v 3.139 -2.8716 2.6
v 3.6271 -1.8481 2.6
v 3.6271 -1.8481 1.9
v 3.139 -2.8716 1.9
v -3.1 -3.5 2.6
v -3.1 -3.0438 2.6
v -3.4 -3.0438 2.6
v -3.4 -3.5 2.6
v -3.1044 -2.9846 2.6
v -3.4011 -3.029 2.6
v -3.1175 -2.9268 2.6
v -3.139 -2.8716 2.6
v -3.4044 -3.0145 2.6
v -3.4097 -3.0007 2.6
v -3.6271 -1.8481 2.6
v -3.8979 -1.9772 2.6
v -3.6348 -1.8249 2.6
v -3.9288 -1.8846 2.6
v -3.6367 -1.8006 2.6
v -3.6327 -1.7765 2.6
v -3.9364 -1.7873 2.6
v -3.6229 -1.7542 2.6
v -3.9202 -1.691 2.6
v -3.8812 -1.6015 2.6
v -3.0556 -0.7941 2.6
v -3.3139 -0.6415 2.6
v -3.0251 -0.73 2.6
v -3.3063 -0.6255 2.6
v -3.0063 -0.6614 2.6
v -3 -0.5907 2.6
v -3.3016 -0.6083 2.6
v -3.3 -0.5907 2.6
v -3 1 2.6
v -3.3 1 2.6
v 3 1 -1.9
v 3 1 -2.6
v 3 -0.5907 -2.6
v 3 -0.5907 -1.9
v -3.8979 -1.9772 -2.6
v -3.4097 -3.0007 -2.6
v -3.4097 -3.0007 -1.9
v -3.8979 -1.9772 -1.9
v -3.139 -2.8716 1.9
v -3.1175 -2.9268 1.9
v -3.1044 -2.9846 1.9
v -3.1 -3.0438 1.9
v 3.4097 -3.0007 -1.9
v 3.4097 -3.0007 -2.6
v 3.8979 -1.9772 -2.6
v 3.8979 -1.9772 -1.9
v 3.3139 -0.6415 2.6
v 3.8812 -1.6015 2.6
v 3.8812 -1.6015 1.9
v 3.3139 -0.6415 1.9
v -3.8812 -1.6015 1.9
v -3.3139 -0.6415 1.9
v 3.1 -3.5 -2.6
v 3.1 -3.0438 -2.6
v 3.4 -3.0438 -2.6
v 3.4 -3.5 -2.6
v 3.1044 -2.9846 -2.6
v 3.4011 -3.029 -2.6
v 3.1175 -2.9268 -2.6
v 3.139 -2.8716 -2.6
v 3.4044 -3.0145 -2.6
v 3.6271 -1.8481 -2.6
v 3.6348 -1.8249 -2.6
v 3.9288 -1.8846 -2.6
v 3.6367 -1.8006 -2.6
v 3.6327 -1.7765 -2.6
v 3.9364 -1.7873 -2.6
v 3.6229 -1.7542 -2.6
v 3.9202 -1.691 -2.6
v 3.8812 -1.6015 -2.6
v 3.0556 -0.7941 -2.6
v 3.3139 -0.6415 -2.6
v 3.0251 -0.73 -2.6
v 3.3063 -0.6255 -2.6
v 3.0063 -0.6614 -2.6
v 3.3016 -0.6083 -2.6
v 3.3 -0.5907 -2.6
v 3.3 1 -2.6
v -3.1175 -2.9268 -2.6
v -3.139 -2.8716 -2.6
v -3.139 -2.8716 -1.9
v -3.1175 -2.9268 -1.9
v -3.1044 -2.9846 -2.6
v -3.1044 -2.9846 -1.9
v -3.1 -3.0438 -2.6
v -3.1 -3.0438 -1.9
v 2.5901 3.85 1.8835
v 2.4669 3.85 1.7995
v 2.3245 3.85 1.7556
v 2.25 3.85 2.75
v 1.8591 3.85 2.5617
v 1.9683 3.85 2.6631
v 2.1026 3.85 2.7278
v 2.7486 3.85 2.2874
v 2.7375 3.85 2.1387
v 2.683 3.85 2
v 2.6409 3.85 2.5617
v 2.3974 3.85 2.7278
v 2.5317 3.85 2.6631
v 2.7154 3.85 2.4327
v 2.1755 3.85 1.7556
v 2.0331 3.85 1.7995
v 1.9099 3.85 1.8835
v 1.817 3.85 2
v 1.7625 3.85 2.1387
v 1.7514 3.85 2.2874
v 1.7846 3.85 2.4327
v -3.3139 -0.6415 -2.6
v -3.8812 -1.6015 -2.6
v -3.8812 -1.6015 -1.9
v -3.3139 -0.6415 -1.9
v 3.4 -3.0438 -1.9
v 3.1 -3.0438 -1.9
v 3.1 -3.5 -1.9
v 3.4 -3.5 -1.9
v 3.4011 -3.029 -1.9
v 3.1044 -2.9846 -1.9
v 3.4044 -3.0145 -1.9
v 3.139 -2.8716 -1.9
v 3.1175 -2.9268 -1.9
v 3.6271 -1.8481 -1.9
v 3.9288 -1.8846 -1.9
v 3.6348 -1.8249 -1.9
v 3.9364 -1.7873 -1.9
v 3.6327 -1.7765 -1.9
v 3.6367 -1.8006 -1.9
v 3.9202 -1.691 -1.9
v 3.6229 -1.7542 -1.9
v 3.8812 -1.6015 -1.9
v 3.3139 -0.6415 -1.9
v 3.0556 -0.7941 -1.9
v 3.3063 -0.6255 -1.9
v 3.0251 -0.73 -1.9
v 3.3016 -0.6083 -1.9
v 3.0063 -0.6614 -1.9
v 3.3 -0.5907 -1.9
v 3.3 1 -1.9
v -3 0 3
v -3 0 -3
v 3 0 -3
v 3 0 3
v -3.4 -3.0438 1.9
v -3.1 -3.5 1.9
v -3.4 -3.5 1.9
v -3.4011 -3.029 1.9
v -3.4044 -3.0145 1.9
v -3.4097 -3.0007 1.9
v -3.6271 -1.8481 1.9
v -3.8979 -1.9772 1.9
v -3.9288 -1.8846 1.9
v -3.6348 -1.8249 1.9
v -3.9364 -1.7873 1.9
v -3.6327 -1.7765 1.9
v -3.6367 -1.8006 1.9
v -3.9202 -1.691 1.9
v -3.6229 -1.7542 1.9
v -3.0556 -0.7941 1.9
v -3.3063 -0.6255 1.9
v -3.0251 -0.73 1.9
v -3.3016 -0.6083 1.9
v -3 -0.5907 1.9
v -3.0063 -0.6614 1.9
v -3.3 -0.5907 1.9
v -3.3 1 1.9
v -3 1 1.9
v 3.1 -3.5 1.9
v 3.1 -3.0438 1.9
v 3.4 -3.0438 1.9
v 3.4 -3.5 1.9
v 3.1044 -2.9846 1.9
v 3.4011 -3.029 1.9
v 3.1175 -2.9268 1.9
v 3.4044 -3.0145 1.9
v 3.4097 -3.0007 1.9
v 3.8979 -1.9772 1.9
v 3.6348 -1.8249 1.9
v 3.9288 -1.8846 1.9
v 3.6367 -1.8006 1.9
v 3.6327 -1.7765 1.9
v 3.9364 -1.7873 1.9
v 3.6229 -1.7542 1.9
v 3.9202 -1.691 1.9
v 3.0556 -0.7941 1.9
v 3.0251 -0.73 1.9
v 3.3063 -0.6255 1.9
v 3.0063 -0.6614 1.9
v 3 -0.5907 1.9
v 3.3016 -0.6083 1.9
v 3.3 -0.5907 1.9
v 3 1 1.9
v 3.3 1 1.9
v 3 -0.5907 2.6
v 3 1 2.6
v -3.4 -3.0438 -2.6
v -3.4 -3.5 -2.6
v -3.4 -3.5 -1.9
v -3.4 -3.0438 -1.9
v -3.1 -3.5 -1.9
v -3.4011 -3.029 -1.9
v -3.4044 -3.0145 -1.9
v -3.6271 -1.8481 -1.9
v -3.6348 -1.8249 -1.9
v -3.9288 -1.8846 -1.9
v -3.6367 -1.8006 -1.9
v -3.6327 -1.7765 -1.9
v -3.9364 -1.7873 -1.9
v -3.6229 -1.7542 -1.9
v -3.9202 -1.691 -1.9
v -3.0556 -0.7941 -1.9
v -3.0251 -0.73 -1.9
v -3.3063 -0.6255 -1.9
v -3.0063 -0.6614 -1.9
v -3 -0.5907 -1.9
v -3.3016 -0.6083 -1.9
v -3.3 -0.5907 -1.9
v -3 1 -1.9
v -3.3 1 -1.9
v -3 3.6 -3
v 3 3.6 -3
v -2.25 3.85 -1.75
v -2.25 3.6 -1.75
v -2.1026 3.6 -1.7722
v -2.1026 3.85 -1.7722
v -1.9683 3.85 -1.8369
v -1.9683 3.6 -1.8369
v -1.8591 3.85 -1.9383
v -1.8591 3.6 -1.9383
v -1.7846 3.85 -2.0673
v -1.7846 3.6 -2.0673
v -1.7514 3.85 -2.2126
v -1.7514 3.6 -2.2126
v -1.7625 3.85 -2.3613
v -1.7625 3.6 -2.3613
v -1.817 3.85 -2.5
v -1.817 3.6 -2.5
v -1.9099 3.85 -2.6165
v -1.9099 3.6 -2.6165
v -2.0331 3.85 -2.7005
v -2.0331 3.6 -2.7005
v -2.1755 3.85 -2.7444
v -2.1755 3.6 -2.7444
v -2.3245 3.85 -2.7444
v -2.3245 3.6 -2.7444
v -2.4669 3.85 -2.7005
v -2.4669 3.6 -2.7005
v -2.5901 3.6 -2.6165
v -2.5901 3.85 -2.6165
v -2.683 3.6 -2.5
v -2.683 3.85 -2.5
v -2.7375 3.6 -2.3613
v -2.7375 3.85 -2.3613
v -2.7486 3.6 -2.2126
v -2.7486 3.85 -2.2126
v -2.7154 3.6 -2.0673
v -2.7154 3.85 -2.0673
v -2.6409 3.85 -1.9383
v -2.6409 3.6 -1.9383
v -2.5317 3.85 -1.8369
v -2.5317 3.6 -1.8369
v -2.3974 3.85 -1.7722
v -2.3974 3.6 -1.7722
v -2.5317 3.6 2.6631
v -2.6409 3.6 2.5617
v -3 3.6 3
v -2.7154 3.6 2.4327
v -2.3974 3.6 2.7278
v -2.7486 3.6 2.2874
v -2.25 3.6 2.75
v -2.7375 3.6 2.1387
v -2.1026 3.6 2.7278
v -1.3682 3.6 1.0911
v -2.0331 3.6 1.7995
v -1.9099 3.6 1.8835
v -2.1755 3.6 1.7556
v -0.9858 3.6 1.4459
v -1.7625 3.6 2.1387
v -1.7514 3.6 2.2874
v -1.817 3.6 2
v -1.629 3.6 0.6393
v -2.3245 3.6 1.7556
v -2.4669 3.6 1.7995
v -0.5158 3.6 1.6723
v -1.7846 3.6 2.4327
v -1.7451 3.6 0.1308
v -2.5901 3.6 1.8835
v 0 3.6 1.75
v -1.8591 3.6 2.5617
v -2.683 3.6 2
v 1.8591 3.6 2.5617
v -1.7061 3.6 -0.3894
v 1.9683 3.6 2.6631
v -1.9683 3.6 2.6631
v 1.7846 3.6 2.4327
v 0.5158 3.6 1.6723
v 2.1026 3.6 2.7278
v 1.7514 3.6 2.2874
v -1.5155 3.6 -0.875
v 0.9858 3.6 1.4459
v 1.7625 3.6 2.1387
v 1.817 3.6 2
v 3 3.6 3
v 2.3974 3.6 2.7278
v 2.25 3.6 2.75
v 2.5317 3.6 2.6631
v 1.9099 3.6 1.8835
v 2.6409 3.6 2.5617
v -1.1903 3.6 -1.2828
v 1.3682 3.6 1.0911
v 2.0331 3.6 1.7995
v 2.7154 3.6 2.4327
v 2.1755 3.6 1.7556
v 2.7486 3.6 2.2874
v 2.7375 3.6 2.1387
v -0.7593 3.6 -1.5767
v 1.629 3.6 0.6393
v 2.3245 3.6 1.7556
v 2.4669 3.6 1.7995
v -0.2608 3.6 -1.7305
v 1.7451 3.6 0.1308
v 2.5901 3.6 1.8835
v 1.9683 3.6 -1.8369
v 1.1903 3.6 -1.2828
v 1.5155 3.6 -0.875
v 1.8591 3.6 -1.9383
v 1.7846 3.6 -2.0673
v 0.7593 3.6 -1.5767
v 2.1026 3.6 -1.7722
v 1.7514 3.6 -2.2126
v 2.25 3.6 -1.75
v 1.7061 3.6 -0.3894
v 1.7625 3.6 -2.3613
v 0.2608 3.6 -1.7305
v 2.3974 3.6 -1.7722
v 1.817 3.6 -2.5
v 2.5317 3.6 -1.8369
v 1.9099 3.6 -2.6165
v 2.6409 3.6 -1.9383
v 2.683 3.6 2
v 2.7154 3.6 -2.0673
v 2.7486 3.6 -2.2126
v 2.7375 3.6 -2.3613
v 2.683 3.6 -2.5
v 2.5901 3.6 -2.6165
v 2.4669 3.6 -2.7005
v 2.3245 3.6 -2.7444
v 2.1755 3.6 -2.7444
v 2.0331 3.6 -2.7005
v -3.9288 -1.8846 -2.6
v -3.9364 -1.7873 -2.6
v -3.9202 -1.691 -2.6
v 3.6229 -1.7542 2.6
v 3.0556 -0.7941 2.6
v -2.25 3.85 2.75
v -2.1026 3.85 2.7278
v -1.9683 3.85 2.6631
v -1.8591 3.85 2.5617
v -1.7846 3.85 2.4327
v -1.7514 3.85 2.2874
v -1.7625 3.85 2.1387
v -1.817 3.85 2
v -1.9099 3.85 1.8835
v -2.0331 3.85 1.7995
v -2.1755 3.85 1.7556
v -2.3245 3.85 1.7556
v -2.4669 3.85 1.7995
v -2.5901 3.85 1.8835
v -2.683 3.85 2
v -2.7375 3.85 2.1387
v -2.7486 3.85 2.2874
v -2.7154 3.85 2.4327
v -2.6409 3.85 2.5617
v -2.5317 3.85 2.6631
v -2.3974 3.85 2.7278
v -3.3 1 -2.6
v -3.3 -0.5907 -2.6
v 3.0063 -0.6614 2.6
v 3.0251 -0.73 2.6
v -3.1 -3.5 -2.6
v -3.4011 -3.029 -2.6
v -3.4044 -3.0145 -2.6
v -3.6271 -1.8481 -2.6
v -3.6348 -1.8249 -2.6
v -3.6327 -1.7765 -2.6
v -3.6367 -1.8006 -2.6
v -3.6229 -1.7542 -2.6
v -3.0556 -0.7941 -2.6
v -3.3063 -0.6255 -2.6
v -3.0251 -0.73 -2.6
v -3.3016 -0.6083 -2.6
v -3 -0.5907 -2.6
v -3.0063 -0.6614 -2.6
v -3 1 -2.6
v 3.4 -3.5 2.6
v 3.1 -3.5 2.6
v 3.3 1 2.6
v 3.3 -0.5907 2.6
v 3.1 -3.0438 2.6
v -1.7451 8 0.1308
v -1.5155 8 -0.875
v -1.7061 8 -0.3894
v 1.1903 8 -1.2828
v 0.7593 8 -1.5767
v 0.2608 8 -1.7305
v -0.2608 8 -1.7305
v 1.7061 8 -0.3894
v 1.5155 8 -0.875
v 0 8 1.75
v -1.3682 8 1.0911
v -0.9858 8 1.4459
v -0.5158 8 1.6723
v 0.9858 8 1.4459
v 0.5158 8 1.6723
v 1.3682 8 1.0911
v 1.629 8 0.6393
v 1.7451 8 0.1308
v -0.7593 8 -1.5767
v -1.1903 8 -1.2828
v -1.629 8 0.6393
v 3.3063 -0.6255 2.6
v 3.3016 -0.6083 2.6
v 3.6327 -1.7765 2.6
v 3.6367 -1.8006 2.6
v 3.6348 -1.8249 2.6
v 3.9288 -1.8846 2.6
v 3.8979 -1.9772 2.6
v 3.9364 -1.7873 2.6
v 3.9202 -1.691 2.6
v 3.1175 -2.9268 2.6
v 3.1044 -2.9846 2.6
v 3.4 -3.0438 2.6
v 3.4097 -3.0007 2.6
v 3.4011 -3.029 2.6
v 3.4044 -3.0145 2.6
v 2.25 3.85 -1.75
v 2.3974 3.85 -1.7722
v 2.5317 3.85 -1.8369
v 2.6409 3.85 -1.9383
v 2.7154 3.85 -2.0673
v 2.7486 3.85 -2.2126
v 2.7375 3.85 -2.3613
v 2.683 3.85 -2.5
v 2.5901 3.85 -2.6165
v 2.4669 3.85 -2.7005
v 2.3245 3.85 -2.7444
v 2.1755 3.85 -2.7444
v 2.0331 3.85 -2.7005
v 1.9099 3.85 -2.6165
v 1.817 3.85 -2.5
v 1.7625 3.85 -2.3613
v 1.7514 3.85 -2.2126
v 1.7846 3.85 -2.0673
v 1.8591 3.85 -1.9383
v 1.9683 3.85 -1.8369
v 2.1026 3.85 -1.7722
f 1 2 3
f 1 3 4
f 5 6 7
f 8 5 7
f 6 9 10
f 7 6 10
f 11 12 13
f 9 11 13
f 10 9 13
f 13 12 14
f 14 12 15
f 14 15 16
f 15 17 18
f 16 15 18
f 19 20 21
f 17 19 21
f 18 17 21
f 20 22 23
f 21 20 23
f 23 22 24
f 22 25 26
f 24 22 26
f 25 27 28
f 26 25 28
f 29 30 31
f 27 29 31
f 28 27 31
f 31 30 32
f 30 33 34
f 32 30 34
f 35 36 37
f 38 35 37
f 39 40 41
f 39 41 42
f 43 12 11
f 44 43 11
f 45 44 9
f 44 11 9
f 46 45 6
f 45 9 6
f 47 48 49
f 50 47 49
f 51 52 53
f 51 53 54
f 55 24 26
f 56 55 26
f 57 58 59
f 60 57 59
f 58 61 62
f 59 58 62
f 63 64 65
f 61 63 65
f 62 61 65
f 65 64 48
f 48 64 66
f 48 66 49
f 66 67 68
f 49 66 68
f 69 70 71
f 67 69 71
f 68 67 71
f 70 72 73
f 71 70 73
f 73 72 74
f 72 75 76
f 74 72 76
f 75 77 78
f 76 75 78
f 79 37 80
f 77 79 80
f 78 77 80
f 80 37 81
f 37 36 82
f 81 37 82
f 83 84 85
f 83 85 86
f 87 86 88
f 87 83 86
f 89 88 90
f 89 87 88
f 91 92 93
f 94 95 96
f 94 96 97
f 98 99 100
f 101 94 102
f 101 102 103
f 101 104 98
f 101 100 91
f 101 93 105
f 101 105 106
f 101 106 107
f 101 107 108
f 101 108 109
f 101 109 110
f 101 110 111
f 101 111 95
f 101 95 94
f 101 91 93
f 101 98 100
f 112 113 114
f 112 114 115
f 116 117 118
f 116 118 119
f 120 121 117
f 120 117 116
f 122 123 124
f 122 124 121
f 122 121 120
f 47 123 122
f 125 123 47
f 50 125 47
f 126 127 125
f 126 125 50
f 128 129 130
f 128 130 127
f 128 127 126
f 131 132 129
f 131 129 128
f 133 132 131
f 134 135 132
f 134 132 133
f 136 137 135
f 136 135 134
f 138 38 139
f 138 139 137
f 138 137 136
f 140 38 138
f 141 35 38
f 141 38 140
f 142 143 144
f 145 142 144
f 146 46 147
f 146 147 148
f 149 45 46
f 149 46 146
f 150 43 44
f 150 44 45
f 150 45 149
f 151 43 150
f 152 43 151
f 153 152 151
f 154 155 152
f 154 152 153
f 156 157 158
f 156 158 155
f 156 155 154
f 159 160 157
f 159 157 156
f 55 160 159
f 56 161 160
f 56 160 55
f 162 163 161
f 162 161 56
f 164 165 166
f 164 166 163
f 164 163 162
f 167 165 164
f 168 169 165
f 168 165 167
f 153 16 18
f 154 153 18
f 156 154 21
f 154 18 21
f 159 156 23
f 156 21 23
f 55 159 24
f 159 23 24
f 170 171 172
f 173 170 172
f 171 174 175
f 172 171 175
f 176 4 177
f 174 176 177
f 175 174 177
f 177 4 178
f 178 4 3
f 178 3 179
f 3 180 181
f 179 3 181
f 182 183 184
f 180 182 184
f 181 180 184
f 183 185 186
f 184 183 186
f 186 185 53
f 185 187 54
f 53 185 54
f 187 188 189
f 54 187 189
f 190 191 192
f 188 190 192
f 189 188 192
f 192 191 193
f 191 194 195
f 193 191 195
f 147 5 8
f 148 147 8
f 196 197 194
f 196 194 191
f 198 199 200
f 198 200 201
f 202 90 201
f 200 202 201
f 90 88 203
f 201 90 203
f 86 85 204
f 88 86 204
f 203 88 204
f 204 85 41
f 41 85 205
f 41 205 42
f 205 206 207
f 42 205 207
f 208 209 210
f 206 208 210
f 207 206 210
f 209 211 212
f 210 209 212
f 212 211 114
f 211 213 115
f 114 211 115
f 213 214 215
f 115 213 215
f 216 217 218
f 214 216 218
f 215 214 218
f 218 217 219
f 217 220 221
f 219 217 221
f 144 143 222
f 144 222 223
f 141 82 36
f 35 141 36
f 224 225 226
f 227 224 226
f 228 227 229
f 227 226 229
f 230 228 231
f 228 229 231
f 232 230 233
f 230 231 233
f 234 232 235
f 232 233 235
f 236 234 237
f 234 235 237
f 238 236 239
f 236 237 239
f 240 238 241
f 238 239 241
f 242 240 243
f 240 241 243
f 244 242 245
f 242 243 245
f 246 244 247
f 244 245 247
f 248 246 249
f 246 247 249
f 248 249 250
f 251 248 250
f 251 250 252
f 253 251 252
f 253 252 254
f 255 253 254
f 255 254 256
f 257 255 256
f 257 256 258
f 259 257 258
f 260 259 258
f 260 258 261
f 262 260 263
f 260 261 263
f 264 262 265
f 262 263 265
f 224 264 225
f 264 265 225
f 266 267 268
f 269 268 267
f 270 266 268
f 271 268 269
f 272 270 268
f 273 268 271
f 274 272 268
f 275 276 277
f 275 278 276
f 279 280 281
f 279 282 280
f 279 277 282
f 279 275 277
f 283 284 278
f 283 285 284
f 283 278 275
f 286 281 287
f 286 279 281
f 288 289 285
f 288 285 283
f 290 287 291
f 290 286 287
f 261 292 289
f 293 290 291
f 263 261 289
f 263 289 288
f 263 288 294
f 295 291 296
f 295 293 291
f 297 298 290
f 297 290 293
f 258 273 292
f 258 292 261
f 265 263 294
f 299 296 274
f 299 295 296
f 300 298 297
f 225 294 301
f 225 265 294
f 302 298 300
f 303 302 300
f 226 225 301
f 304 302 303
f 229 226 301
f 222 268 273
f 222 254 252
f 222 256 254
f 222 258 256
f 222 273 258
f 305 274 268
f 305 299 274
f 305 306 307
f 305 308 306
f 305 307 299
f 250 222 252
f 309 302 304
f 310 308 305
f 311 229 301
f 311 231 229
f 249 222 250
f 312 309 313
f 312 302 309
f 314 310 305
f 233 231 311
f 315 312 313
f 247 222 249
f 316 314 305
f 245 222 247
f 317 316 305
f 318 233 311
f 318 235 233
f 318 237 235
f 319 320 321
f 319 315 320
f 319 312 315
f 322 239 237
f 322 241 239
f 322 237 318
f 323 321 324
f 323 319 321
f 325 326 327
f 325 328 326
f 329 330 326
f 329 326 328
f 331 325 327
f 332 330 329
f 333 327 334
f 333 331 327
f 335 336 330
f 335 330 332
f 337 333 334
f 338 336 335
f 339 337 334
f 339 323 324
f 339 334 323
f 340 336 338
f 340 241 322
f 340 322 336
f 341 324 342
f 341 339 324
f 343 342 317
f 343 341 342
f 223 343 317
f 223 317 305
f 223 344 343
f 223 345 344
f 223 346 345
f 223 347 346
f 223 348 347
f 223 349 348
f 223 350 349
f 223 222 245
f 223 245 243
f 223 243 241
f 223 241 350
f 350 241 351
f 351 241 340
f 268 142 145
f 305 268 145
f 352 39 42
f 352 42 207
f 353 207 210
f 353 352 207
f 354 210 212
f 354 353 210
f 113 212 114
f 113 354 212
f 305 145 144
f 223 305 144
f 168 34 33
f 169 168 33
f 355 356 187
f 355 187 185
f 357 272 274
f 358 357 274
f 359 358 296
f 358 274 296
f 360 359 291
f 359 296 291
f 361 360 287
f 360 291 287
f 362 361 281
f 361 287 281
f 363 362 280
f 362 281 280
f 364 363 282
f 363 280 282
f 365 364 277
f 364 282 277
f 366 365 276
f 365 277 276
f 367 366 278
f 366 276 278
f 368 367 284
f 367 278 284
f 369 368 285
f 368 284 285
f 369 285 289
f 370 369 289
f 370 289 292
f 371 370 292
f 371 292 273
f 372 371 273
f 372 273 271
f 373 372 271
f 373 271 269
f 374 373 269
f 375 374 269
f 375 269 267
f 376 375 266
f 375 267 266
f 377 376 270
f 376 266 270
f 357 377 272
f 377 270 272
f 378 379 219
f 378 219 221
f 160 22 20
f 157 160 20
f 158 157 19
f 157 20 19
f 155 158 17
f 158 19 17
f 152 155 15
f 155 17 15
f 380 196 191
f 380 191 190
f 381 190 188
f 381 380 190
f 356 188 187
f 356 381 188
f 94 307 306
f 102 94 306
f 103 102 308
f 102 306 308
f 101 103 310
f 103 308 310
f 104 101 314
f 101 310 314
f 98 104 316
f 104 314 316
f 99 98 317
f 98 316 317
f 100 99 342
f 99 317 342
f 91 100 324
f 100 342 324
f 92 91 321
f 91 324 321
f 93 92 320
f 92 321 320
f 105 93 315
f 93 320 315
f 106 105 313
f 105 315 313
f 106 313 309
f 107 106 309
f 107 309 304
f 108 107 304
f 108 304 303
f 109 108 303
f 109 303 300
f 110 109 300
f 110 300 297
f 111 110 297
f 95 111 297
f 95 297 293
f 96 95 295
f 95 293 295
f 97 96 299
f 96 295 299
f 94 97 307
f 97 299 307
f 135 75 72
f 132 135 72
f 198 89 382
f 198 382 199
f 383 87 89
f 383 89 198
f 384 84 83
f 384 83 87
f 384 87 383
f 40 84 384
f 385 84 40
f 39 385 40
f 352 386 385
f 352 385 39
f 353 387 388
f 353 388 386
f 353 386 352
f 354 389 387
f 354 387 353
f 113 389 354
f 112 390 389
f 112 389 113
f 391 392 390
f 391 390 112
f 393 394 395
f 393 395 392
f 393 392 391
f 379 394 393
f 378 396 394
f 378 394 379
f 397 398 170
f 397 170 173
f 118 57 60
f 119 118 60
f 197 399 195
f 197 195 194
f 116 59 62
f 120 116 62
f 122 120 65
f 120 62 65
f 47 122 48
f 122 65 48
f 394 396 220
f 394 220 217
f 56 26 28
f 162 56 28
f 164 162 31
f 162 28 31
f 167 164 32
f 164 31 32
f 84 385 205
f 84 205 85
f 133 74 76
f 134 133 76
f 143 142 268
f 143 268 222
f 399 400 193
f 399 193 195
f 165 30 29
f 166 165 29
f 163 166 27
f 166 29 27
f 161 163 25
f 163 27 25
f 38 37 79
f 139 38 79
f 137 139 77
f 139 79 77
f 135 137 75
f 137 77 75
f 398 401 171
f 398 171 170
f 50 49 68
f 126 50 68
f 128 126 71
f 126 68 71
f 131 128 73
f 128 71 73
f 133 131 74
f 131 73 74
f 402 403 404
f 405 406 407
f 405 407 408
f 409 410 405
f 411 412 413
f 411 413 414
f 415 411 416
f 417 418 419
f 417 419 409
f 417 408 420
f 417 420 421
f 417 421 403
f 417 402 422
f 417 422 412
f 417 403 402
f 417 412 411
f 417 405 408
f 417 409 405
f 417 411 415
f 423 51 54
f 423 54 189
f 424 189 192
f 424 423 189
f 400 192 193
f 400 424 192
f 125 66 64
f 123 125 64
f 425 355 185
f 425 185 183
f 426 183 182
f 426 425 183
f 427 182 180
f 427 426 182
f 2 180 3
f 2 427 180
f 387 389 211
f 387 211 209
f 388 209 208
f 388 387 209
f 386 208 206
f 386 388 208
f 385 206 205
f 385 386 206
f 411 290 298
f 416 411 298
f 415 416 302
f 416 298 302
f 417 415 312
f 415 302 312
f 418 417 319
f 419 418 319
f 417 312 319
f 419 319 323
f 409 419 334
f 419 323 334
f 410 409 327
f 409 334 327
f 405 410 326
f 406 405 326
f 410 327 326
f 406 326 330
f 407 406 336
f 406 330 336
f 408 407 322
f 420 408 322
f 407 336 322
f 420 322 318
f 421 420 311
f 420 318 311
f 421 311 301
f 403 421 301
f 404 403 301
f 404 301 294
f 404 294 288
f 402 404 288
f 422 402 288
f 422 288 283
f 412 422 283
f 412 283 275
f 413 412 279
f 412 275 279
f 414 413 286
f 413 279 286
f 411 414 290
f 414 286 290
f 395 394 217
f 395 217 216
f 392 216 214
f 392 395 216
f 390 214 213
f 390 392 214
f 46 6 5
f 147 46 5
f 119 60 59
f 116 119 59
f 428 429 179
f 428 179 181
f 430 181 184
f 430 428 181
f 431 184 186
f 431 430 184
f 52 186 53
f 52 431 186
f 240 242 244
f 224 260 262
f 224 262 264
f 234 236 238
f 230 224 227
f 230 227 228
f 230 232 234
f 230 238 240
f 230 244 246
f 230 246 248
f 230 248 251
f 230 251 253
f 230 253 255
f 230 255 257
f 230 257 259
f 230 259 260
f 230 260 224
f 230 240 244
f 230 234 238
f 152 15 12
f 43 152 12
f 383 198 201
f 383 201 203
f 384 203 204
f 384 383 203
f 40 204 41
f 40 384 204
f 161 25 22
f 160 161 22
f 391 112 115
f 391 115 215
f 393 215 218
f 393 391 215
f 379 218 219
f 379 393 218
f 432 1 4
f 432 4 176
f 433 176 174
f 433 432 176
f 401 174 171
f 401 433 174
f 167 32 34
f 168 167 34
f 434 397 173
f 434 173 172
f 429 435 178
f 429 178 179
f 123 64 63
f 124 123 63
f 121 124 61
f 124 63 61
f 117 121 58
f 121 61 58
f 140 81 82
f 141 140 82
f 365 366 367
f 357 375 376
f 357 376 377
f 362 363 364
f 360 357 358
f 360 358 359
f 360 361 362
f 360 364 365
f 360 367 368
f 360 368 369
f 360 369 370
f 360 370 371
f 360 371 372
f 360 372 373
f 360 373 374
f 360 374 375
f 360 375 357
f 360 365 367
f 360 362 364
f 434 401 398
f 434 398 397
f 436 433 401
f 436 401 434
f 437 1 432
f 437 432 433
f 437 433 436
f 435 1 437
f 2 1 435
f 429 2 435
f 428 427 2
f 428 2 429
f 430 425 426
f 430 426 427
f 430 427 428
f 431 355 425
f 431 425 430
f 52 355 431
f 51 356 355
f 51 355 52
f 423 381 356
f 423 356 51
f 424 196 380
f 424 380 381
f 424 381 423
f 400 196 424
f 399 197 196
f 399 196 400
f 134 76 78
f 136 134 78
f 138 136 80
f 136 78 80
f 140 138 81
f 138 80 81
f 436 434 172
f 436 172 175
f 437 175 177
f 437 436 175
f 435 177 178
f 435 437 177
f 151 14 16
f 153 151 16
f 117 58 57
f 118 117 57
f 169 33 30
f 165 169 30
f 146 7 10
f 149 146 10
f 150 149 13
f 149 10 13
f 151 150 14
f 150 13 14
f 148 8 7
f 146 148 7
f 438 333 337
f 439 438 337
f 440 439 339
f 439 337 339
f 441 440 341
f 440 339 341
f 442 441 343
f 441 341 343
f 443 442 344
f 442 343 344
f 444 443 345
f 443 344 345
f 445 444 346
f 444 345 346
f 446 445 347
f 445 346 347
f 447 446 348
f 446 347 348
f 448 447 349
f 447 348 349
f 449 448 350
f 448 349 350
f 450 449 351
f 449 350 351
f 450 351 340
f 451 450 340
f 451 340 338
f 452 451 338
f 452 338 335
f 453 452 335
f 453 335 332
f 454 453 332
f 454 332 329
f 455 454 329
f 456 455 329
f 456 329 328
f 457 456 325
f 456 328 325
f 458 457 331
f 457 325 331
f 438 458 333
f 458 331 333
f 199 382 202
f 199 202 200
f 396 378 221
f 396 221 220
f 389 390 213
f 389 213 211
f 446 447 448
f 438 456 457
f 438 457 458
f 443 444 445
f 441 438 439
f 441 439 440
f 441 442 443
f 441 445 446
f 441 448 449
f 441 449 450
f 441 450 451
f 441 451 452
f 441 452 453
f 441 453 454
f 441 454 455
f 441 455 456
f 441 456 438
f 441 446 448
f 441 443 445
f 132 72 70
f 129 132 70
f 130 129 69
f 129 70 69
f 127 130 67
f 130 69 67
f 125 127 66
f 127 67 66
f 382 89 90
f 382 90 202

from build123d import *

# Parameters (mm, degrees)
SKETCH1_W            = 6
SKETCH1_H            = 6
BOSS_EXTRUDE1_DEPTH  = 3.6
SKETCH3_R            = 1.75
BOSS_EXTRUDE2_DEPTH  = 4.4
SKETCH4_R            = 0.5
BOSS_EXTRUDE3_DEPTH  = 0.25
LPATTERN1_COUNT      = 2
LPATTERN1_PITCH      = 4.5
LPATTERN1_COUNT_DIR2 = 2
LPATTERN1_PITCH_DIR2 = 4.5
BASE_FLANGE1_DEPTH   = 0.7
BASE_FLANGE2_DEPTH   = 0.7
BASE_FLANGE3_DEPTH   = 0.7
BASE_FLANGE4_DEPTH   = 0.7


# Sheet-metal steps are written as plain solids
with BuildPart() as part:
    # Sketch1 → Boss-Extrude1 (new body)
    with BuildSketch(Plane(origin=(0, 0, 0), x_dir=(1, 0, 0), z_dir=(0, 1, 0))):
        Rectangle(SKETCH1_W, SKETCH1_H)
    extrude(amount=BOSS_EXTRUDE1_DEPTH)

    # Sketch3 → Boss-Extrude2 (add)
    with BuildSketch(Plane(origin=(0, 3.6, 0), x_dir=(1, 0, 0), z_dir=(0, 1, 0))):
        with Locations(Location((0, 0, 0), (0, 0, 270))):
            Circle(SKETCH3_R)
    extrude(amount=BOSS_EXTRUDE2_DEPTH)

    # Sketch4 → Boss-Extrude3 (add)
    with BuildSketch(Plane(origin=(0, 3.6, 0), x_dir=(1, 0, 0), z_dir=(0, 1, 0))):
        with Locations(Location((-2.25, -2.25, 0), (0, 0, 270))):
            Circle(SKETCH4_R)
    boss_extrude3 = extrude(amount=BOSS_EXTRUDE3_DEPTH)

    # LPattern1: Boss-Extrude3 2 × 2
    with Locations(*[(i * LPATTERN1_PITCH, 0, -j * LPATTERN1_PITCH_DIR2) for i in range(LPATTERN1_COUNT) for j in range(LPATTERN1_COUNT_DIR2) if (i, j) != (0, 0)]):
        add(boss_extrude3)


with BuildPart() as body_2:
    # Sketch6 → Base-Flange1 (new body)
    with BuildSketch(Plane.XY.offset(2.6)):
        with BuildLine():
            Line((3, 1), (3, -0.590650318))
            ThreePointArc((3, -0.590650318), (3.014157905, -0.696129594), (3.055629389, -0.794142042))
            Line((3.055629389, -0.794142042), (3.62290698, -1.754150273))
            ThreePointArc((3.62290698, -1.754150273), (3.636715992, -1.800589547), (3.627075137, -1.848069531))
            Line((3.627075137, -1.848069531), (3.138956761, -2.871570572))
            ThreePointArc((3.138956761, -2.871570572), (3.109860733, -2.955487241), (3.1, -3.043755877))
            Line((3.1, -3.043755877), (3.1, -3.5))
            Line((3.1, -3.5), (3.4, -3.5))
            Line((3.4, -3.5), (3.4, -3.043755877))
            ThreePointArc((3.4, -3.043755877), (3.402465183, -3.021688718), (3.40973919, -3.000709551))
            Line((3.40973919, -3.000709551), (3.897857566, -1.97720851))
            ThreePointArc((3.897857566, -1.97720851), (3.936420987, -1.787288575), (3.881184938, -1.60153148))
            Line((3.881184938, -1.60153148), (3.313907347, -0.641523249))
            ThreePointArc((3.313907347, -0.641523249), (3.303539476, -0.617020137), (3.3, -0.590650318))
            Line((3.3, -0.590650318), (3.3, 1))
            Line((3.3, 1), (3, 1))
        make_face()
    extrude(amount=-BASE_FLANGE1_DEPTH)


with BuildPart() as body_3:
    # Sketch9 → Base-Flange2 (new body)
    with BuildSketch(Plane.XY.offset(2.6)):
        with BuildLine():
            Line((-3, 1), (-3, -0.590650318))
            ThreePointArc((-3, -0.590650318), (-3.014157905, -0.696129594), (-3.055629389, -0.794142042))
            Line((-3.055629389, -0.794142042), (-3.62290698, -1.754150273))
            ThreePointArc((-3.62290698, -1.754150273), (-3.636715992, -1.800589547), (-3.627075137, -1.848069531))
            Line((-3.627075137, -1.848069531), (-3.138956761, -2.871570572))
            ThreePointArc((-3.138956761, -2.871570572), (-3.109860733, -2.955487241), (-3.1, -3.043755877))
            Line((-3.1, -3.043755877), (-3.1, -3.5))
            Line((-3.1, -3.5), (-3.4, -3.5))
            Line((-3.4, -3.5), (-3.4, -3.043755877))
            ThreePointArc((-3.4, -3.043755877), (-3.402465183, -3.021688718), (-3.40973919, -3.000709551))
            Line((-3.40973919, -3.000709551), (-3.897857566, -1.97720851))
            ThreePointArc((-3.897857566, -1.97720851), (-3.936420987, -1.787288575), (-3.881184938, -1.60153148))
            Line((-3.881184938, -1.60153148), (-3.313907347, -0.641523249))
            ThreePointArc((-3.313907347, -0.641523249), (-3.303539476, -0.617020137), (-3.3, -0.590650318))
            Line((-3.3, -0.590650318), (-3.3, 1))
            Line((-3.3, 1), (-3, 1))
        make_face()
    extrude(amount=-BASE_FLANGE2_DEPTH)


with BuildPart() as body_4:
    # Sketch12 → Base-Flange3 (new body)
    with BuildSketch(Plane(origin=(0, 0, -2.6), x_dir=(-1, 0, 0), z_dir=(0, 0, -1))):
        with BuildLine():
            Line((-3, 1), (-3, -0.590650318))
            ThreePointArc((-3, -0.590650318), (-3.014157905, -0.696129594), (-3.055629389, -0.794142042))
            Line((-3.055629389, -0.794142042), (-3.62290698, -1.754150273))
            ThreePointArc((-3.62290698, -1.754150273), (-3.636715992, -1.800589547), (-3.627075137, -1.848069531))
            Line((-3.627075137, -1.848069531), (-3.138956761, -2.871570572))
            ThreePointArc((-3.138956761, -2.871570572), (-3.109860733, -2.955487241), (-3.1, -3.043755877))
            Line((-3.1, -3.043755877), (-3.1, -3.5))
            Line((-3.1, -3.5), (-3.4, -3.5))
            Line((-3.4, -3.5), (-3.4, -3.043755877))
            ThreePointArc((-3.4, -3.043755877), (-3.402465183, -3.021688718), (-3.40973919, -3.000709551))
            Line((-3.40973919, -3.000709551), (-3.897857566, -1.97720851))
            ThreePointArc((-3.897857566, -1.97720851), (-3.936420987, -1.787288575), (-3.881184938, -1.60153148))
            Line((-3.881184938, -1.60153148), (-3.313907347, -0.641523249))
            ThreePointArc((-3.313907347, -0.641523249), (-3.303539476, -0.617020137), (-3.3, -0.590650318))
            Line((-3.3, -0.590650318), (-3.3, 1))
            Line((-3.3, 1), (-3, 1))
        make_face()
    extrude(amount=-BASE_FLANGE3_DEPTH)


with BuildPart() as body_5:
    # Sketch15 → Base-Flange4 (new body)
    with BuildSketch(Plane(origin=(0, 0, -2.6), x_dir=(-1, 0, 0), z_dir=(0, 0, -1))):
        with BuildLine():
            Line((3, 1), (3, -0.590650318))
            ThreePointArc((3, -0.590650318), (3.014157905, -0.696129594), (3.055629389, -0.794142042))
            Line((3.055629389, -0.794142042), (3.62290698, -1.754150273))
            ThreePointArc((3.62290698, -1.754150273), (3.636715992, -1.800589547), (3.627075137, -1.848069531))
            Line((3.627075137, -1.848069531), (3.138956761, -2.871570572))
            ThreePointArc((3.138956761, -2.871570572), (3.109860733, -2.955487241), (3.1, -3.043755877))
            Line((3.1, -3.043755877), (3.1, -3.5))
            Line((3.1, -3.5), (3.4, -3.5))
            Line((3.4, -3.5), (3.4, -3.043755877))
            ThreePointArc((3.4, -3.043755877), (3.402465183, -3.021688718), (3.40973919, -3.000709551))
            Line((3.40973919, -3.000709551), (3.897857566, -1.97720851))
            ThreePointArc((3.897857566, -1.97720851), (3.936420987, -1.787288575), (3.881184938, -1.60153148))
            Line((3.881184938, -1.60153148), (3.313907347, -0.641523249))
            ThreePointArc((3.313907347, -0.641523249), (3.303539476, -0.617020137), (3.3, -0.590650318))
            Line((3.3, -0.590650318), (3.3, 1))
            Line((3.3, 1), (3, 1))
        make_face()
    extrude(amount=-BASE_FLANGE4_DEPTH)


solid = Compound([part.part, body_2.part, body_3.part, body_4.part, body_5.part])
